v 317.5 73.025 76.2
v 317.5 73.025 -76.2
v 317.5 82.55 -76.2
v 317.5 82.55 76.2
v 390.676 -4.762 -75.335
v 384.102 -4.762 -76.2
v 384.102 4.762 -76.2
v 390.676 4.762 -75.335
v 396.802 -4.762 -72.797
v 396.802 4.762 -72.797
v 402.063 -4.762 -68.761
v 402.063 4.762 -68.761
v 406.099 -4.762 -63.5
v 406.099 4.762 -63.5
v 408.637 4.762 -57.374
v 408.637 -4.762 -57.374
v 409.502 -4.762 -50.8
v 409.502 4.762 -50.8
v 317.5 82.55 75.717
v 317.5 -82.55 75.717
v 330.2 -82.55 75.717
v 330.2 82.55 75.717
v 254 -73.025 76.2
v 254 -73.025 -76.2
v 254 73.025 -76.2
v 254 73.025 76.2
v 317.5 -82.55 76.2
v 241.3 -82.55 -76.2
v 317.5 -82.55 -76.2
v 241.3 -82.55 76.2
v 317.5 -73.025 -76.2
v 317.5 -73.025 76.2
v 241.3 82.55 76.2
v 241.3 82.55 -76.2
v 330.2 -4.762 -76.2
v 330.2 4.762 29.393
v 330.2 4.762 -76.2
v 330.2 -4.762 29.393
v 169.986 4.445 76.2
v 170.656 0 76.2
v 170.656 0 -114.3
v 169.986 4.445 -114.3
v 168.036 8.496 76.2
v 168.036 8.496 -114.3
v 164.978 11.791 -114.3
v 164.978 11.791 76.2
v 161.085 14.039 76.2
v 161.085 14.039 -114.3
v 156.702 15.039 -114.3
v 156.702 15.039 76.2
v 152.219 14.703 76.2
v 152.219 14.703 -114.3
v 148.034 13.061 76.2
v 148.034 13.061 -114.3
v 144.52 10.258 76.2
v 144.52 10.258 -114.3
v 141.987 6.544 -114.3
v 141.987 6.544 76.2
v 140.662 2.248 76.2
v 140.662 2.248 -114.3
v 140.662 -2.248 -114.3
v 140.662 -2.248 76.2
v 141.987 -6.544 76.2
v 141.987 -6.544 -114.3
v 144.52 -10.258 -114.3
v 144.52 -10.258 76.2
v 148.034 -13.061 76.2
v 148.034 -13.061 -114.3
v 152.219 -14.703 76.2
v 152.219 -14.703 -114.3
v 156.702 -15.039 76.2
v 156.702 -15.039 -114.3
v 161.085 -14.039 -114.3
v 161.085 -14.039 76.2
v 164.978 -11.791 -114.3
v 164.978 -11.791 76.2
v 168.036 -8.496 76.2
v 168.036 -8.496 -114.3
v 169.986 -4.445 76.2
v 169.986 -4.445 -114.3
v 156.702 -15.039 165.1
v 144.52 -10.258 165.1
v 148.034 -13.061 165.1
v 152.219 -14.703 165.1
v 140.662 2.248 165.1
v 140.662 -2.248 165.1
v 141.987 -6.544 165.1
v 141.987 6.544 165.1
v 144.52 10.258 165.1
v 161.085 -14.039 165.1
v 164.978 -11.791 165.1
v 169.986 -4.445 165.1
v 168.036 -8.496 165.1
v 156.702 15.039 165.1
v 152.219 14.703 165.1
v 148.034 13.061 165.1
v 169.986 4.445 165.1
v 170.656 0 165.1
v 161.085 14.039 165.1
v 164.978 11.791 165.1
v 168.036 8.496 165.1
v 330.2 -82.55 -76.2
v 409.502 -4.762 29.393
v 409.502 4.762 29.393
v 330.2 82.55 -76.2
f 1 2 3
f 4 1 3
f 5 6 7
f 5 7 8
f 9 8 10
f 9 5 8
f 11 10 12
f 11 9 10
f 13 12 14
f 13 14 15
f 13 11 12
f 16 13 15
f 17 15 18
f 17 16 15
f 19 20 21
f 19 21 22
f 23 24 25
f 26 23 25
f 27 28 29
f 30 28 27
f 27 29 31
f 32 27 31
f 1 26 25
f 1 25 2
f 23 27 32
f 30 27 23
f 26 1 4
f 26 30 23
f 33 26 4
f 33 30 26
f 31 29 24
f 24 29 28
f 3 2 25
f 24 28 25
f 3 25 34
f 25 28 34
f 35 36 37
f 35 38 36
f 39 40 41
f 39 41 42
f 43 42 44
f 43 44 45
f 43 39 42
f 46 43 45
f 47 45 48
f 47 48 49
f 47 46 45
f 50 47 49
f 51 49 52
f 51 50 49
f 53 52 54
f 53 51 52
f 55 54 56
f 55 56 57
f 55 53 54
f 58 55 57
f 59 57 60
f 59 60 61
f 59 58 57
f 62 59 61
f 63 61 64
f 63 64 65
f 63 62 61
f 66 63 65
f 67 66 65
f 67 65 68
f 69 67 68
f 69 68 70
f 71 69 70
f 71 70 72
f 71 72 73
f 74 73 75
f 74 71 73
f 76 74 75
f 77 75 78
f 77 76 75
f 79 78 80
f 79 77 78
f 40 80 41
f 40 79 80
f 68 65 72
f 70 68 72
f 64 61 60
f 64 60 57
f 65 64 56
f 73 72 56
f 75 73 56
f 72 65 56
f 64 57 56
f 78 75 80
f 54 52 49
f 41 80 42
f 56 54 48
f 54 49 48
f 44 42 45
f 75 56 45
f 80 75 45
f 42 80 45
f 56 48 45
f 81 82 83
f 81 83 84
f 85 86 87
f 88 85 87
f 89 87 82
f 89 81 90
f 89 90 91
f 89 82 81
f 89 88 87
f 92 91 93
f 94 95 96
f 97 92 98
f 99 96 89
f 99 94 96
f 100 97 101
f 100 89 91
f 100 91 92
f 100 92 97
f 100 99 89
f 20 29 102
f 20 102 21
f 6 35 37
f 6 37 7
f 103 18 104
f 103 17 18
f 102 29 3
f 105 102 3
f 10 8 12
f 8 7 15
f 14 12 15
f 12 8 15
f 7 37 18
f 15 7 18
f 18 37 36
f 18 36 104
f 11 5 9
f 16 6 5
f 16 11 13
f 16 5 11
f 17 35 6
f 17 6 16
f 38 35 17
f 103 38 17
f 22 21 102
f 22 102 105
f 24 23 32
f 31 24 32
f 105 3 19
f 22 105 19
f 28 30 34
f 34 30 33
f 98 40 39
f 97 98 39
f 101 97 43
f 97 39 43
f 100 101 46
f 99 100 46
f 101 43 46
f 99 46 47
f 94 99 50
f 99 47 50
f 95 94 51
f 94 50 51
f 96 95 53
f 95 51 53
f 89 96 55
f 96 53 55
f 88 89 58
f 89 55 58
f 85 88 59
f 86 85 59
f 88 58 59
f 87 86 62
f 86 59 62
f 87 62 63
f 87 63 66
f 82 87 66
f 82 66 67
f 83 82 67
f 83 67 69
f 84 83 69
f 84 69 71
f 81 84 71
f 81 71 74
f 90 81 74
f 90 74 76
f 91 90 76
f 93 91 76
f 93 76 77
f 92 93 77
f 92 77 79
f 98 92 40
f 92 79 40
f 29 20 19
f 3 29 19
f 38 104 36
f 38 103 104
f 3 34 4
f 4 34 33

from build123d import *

# Parameters (mm, degrees)
F1_W           = 165.1
F1_H           = 152.4
F2_DEPTH       = 12.7
F2_DEPTH_BACK  = 63.5
F3_R           = 15.08125
F4_DEPTH       = 190.5
F4_DEPTH_BACK  = 88.9
F5_W           = 63.5
F5_H           = 146.05
F6_DEPTH       = 190.501
F7_W           = 165.1
F7_H           = 151.91683079
F8_DEPTH       = 12.7
F10_DEPTH      = 4.7625
F10_DEPTH_BACK = 4.7625


with BuildPart() as f2:
    # F1 (on offset) → F2 (new body, two sides)
    with BuildSketch(Plane.YZ.offset(254)) as f2_sk:
        Rectangle(F1_W, F1_H)
    extrude(amount=-F2_DEPTH)
    extrude(f2_sk.sketch, amount=F2_DEPTH_BACK)

    # F5 (on face) → F6 (cut, through all)
    with BuildSketch(Plane.XY.offset(76.2)):
        with Locations((285.75, 0)):
            Rectangle(F5_W, F5_H)
    extrude(amount=-F6_DEPTH, mode=Mode.SUBTRACT)


with BuildPart() as f4:
    # F3 (on face) → F4 (new body, two sides)
    with BuildSketch(Plane.XY.offset(76.2)) as f4_sk:
        with Locations((155.575, 0)):
            Circle(F3_R)
    extrude(amount=-F4_DEPTH)
    extrude(f4_sk.sketch, amount=F4_DEPTH_BACK)


with BuildPart() as f8:
    # F7 (on face) → F8 (new body)
    with BuildSketch(Plane.YZ.offset(317.5)):
        with Locations((0, -0.241584605)):
            Rectangle(F7_W, F7_H)
    extrude(amount=F8_DEPTH)


with BuildPart() as f10:
    # F9 (on Front) → F10 (new body, two sides)
    with BuildSketch(Plane.XZ) as f10_sk:
        with BuildLine():
            Line((330.2, 29.3925244), (330.2, -76.2))
            Line((330.2, -76.2), (384.1022377459, -76.2))
            ThreePointArc((384.1022377459, -76.2), (402.0627499881, -68.7605122421), (409.5022377459, -50.8))
            Line((409.5022377459, -50.8), (409.5022377459, 29.3925244))
            Line((409.5022377459, 29.3925244), (330.2, 29.3925244))
        make_face()
    extrude(amount=F10_DEPTH)
    extrude(f10_sk.sketch, amount=-F10_DEPTH_BACK)


solid = Compound([f2.part, f4.part, f8.part, f10.part])
